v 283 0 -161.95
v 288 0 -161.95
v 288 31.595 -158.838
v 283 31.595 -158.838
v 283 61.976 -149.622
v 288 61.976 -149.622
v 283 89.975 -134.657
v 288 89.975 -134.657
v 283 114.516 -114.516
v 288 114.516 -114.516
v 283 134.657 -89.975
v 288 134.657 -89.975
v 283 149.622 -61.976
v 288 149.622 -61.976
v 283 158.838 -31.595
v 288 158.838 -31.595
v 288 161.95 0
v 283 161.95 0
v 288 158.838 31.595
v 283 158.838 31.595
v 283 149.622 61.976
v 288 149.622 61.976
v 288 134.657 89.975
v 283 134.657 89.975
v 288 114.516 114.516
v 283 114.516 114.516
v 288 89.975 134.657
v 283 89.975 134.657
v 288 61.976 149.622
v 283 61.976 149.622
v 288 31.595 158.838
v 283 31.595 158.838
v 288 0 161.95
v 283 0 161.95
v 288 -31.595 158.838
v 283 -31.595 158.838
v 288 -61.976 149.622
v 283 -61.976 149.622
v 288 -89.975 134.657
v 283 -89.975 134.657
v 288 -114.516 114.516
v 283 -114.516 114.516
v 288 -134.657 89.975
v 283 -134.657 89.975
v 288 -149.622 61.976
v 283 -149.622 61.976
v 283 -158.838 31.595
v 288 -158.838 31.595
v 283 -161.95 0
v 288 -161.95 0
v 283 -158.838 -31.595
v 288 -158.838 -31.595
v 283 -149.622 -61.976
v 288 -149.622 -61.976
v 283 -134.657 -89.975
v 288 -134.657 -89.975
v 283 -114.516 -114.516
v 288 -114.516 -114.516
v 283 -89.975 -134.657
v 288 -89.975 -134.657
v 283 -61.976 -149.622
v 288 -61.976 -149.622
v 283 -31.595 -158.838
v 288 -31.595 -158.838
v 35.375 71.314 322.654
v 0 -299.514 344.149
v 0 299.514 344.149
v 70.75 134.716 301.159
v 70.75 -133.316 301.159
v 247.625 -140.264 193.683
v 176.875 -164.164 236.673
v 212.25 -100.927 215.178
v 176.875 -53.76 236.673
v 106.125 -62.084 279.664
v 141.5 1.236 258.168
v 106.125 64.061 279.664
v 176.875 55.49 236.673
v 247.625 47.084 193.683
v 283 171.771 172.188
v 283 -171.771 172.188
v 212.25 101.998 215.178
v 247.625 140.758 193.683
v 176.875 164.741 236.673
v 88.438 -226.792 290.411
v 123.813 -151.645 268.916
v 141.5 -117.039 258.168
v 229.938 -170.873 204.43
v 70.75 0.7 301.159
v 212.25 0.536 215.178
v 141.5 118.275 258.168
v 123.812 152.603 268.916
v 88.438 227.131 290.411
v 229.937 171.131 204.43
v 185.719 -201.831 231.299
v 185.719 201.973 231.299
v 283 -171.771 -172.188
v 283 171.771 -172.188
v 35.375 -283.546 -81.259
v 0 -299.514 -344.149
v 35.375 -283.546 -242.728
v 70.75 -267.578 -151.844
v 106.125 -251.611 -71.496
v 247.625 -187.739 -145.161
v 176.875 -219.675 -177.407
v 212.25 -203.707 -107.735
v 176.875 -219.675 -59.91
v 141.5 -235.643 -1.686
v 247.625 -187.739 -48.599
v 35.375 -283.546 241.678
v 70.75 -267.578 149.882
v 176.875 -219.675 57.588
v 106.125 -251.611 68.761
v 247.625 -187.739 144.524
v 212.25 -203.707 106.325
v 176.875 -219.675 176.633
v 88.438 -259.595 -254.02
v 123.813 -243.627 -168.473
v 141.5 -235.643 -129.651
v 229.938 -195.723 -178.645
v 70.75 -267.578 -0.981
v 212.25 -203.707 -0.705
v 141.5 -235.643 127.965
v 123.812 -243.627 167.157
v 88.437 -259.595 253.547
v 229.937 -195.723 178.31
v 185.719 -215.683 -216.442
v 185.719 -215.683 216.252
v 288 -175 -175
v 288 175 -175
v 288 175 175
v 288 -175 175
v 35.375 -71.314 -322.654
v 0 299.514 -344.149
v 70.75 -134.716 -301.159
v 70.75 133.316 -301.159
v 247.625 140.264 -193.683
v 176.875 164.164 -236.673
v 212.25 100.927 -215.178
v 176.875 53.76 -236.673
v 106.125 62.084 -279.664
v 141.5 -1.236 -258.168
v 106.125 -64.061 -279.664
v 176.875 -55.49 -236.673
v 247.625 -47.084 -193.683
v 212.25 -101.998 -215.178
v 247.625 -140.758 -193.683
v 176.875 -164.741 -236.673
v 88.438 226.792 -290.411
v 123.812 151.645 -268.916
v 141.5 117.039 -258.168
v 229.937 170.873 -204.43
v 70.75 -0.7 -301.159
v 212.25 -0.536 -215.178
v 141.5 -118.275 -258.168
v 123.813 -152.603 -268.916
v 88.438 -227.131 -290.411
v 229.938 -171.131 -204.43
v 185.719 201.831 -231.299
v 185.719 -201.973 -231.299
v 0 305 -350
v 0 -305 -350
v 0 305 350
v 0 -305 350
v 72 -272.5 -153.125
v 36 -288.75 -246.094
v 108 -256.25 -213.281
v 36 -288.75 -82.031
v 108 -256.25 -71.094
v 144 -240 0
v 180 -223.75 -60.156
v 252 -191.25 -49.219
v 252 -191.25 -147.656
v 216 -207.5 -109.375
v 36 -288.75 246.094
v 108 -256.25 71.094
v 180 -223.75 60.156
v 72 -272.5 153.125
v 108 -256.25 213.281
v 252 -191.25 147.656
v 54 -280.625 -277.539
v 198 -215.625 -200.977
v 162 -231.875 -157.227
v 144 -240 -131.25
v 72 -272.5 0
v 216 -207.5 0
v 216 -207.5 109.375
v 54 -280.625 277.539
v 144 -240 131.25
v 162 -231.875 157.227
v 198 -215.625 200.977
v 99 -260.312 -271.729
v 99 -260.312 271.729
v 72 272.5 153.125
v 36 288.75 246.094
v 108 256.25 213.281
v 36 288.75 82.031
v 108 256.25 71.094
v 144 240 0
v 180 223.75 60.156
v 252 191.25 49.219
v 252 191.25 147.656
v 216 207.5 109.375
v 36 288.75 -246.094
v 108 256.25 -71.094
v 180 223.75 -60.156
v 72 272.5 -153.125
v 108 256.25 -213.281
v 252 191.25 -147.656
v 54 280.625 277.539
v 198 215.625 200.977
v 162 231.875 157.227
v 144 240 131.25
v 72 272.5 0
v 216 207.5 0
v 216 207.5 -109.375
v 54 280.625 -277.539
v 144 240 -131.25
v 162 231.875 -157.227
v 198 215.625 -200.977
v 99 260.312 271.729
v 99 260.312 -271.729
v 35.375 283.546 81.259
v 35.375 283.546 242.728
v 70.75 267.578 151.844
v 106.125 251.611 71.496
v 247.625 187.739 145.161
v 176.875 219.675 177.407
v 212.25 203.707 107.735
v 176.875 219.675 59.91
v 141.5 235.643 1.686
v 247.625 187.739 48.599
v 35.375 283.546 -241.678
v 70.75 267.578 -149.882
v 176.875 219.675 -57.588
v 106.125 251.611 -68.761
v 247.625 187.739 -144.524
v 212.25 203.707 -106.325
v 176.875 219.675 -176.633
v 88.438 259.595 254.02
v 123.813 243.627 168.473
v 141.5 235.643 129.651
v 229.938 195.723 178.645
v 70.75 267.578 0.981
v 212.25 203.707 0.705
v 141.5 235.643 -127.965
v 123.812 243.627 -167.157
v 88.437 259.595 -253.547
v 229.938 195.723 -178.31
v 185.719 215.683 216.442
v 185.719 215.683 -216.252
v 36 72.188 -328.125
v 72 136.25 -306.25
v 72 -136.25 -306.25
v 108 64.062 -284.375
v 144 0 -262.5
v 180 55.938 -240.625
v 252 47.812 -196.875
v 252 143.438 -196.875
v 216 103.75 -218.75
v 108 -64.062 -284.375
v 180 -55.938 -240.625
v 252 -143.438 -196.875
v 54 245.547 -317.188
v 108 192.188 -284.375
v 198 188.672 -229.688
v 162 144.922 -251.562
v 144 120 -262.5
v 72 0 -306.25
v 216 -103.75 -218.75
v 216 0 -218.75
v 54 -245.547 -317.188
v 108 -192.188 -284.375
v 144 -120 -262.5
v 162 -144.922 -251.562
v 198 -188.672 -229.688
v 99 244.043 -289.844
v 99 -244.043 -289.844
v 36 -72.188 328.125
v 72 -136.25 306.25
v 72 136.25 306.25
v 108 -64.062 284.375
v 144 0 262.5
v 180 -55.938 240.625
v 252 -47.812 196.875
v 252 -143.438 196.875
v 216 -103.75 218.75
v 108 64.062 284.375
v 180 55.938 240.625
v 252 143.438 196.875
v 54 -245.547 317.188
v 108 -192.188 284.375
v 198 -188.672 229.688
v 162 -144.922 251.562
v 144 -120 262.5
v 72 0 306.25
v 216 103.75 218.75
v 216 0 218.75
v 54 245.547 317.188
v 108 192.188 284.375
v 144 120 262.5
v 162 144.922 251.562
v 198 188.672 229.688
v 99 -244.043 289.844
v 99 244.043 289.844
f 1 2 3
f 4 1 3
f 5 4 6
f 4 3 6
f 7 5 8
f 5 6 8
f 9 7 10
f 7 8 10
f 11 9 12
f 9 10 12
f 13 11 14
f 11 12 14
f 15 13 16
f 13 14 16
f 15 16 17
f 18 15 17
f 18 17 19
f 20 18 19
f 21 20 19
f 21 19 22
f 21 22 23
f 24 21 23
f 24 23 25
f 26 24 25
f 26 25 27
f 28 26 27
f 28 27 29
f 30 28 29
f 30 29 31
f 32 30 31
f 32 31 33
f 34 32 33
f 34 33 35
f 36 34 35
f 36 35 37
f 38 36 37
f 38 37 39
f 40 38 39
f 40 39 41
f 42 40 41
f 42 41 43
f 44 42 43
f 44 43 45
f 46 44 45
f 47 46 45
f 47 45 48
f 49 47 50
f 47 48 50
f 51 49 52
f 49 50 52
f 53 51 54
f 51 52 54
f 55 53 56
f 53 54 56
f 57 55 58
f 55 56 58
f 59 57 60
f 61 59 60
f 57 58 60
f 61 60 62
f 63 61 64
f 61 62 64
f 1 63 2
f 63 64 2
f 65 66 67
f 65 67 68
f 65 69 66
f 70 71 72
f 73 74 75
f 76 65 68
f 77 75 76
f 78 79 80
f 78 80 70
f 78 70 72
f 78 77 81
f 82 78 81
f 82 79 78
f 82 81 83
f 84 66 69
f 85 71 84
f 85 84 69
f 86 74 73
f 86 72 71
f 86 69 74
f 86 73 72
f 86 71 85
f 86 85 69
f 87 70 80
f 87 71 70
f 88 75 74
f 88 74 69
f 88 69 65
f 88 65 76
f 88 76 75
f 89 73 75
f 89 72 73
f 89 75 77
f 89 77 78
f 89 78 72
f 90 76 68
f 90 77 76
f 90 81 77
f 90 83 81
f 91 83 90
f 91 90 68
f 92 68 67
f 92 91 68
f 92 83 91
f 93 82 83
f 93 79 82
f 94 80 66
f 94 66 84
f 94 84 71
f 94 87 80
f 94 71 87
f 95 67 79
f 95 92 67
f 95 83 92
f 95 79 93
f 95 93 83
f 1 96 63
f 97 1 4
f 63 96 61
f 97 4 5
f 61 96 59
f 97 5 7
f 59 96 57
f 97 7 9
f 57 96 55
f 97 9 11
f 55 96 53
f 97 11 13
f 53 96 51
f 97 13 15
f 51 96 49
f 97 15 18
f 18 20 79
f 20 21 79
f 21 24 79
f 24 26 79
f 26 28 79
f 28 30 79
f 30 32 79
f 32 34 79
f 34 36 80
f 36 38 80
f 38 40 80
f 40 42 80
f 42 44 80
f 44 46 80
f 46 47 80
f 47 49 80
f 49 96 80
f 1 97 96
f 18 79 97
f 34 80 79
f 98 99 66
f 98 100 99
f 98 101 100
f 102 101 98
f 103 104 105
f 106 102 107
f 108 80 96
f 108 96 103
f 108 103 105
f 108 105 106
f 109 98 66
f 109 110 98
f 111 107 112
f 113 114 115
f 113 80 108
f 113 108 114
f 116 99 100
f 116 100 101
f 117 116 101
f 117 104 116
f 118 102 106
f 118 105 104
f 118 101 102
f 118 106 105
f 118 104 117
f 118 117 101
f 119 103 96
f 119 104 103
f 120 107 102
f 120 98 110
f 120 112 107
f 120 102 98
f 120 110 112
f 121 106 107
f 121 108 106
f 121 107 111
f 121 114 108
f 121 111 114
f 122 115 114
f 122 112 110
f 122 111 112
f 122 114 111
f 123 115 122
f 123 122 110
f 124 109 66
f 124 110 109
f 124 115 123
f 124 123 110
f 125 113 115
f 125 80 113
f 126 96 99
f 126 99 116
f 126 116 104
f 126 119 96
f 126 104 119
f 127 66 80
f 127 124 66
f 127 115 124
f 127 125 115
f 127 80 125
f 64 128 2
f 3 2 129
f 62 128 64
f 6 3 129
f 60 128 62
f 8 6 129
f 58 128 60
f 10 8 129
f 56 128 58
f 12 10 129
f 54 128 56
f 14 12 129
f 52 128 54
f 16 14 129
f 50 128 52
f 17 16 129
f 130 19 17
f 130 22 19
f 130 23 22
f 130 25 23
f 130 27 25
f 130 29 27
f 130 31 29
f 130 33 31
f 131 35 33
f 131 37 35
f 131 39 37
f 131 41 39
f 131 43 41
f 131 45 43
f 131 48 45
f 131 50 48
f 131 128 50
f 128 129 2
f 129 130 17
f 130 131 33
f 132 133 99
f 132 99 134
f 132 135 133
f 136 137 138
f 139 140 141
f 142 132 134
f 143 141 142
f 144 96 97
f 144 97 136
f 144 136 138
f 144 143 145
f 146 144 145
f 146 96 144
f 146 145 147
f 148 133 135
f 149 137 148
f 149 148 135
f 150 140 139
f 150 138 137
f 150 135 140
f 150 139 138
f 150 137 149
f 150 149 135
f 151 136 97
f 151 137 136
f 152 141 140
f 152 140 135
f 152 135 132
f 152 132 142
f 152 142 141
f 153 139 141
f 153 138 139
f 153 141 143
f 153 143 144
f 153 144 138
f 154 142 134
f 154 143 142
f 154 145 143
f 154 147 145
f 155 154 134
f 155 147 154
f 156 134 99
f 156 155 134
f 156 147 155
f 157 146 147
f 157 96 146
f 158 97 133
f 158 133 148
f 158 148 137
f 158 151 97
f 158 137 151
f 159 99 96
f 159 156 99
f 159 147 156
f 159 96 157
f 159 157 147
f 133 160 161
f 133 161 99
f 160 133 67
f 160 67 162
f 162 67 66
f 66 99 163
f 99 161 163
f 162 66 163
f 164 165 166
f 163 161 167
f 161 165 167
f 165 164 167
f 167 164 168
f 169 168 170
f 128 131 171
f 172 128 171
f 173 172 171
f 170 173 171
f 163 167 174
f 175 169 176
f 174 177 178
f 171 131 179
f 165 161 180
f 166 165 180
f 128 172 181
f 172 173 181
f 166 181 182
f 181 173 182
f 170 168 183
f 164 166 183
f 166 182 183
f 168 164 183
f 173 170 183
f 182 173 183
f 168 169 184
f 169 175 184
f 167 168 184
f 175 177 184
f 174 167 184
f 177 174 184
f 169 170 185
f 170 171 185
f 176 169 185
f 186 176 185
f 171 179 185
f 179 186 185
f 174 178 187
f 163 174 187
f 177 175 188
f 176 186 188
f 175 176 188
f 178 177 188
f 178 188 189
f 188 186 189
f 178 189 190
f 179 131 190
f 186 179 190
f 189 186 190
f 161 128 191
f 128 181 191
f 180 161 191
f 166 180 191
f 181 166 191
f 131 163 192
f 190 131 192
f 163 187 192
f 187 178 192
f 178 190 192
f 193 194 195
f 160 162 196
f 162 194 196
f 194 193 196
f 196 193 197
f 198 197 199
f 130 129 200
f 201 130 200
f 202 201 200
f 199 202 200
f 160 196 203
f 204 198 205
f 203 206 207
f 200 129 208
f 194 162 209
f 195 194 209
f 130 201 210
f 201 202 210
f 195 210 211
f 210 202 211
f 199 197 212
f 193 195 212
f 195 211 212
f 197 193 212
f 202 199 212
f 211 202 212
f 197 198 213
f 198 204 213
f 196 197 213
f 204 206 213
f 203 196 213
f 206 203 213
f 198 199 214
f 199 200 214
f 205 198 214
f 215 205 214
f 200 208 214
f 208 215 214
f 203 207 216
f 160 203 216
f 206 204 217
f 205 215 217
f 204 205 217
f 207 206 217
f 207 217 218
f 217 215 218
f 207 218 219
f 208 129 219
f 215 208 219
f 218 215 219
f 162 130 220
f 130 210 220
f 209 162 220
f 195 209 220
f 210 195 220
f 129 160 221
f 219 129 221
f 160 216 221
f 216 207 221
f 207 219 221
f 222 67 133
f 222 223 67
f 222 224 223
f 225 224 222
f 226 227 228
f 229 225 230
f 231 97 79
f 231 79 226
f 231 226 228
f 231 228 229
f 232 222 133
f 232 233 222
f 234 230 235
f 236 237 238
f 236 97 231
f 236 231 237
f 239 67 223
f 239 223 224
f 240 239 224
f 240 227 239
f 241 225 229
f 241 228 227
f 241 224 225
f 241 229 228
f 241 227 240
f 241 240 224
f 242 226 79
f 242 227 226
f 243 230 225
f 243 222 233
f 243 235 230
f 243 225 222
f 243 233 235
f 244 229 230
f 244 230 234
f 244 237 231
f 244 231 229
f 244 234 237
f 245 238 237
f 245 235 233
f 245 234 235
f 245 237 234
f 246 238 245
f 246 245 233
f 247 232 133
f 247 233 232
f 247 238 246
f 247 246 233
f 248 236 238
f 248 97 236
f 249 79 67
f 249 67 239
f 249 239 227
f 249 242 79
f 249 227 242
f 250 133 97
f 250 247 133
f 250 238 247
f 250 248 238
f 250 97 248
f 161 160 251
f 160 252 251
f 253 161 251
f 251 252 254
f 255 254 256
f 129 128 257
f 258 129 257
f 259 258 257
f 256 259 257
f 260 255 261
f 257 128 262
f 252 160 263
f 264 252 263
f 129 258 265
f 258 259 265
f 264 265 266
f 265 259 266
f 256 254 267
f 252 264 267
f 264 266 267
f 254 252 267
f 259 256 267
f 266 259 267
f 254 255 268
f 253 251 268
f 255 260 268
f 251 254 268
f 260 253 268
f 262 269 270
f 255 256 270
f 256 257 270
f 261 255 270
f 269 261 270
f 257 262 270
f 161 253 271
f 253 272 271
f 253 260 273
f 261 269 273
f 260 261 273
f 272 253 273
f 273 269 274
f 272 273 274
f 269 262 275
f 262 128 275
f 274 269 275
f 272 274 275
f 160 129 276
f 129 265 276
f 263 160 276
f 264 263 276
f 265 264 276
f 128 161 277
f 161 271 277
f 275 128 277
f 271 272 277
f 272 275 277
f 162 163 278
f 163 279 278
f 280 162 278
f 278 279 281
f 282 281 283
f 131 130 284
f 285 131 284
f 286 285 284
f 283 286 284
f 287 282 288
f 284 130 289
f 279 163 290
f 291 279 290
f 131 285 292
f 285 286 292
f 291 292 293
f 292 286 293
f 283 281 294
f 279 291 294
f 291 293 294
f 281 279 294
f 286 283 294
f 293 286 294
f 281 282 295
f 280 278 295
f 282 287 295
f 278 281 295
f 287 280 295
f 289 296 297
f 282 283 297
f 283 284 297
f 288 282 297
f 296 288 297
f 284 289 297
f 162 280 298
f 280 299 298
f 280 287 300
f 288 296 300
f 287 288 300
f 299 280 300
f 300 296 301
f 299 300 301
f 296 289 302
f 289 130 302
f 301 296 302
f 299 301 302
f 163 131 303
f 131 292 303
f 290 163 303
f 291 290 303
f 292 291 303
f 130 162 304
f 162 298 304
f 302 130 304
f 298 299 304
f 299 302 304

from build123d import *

# Parameters (mm, degrees)
SHELL1_T           = -5
SKETCH3_R          = 161.95
CUT_EXTRUDE1_DEPTH = 10


with BuildPart() as part:
    # Sketch1 → Loft1 section 0
    with BuildSketch(Plane(origin=(0, 0, 0), x_dir=(0, 0, -1), z_dir=(1, 0, 0))):
        with BuildLine():
            Line((350, -305), (-350, -305))
            Line((-350, -305), (-350, 305))
            Line((-350, 305), (350, 305))
            Line((350, 305), (350, -305))
        make_face()
    # Sketch2 → Loft1 section 1
    with BuildSketch(Plane(origin=(288, 0, 0), x_dir=(0, 0, -1), z_dir=(1, 0, 0))):
        with BuildLine():
            Line((175, -175), (-175, -175))
            Line((-175, -175), (-175, 175))
            Line((-175, 175), (175, 175))
            Line((175, 175), (175, -175))
        make_face()
    loft()

    # Shell1
    shell1_openings = [part.faces().sort_by_distance(p)[0] for p in [
        (0, 0, 0),
    ]]
    offset(amount=SHELL1_T, openings=shell1_openings, kind=Kind.INTERSECTION)

    # Sketch3 → Cut-Extrude1 (cut)
    with BuildSketch(Plane(origin=(288, 0, 0), x_dir=(0, 0, -1), z_dir=(1, 0, 0))):
        Circle(SKETCH3_R)
    extrude(amount=-CUT_EXTRUDE1_DEPTH, mode=Mode.SUBTRACT)


solid = part.part
